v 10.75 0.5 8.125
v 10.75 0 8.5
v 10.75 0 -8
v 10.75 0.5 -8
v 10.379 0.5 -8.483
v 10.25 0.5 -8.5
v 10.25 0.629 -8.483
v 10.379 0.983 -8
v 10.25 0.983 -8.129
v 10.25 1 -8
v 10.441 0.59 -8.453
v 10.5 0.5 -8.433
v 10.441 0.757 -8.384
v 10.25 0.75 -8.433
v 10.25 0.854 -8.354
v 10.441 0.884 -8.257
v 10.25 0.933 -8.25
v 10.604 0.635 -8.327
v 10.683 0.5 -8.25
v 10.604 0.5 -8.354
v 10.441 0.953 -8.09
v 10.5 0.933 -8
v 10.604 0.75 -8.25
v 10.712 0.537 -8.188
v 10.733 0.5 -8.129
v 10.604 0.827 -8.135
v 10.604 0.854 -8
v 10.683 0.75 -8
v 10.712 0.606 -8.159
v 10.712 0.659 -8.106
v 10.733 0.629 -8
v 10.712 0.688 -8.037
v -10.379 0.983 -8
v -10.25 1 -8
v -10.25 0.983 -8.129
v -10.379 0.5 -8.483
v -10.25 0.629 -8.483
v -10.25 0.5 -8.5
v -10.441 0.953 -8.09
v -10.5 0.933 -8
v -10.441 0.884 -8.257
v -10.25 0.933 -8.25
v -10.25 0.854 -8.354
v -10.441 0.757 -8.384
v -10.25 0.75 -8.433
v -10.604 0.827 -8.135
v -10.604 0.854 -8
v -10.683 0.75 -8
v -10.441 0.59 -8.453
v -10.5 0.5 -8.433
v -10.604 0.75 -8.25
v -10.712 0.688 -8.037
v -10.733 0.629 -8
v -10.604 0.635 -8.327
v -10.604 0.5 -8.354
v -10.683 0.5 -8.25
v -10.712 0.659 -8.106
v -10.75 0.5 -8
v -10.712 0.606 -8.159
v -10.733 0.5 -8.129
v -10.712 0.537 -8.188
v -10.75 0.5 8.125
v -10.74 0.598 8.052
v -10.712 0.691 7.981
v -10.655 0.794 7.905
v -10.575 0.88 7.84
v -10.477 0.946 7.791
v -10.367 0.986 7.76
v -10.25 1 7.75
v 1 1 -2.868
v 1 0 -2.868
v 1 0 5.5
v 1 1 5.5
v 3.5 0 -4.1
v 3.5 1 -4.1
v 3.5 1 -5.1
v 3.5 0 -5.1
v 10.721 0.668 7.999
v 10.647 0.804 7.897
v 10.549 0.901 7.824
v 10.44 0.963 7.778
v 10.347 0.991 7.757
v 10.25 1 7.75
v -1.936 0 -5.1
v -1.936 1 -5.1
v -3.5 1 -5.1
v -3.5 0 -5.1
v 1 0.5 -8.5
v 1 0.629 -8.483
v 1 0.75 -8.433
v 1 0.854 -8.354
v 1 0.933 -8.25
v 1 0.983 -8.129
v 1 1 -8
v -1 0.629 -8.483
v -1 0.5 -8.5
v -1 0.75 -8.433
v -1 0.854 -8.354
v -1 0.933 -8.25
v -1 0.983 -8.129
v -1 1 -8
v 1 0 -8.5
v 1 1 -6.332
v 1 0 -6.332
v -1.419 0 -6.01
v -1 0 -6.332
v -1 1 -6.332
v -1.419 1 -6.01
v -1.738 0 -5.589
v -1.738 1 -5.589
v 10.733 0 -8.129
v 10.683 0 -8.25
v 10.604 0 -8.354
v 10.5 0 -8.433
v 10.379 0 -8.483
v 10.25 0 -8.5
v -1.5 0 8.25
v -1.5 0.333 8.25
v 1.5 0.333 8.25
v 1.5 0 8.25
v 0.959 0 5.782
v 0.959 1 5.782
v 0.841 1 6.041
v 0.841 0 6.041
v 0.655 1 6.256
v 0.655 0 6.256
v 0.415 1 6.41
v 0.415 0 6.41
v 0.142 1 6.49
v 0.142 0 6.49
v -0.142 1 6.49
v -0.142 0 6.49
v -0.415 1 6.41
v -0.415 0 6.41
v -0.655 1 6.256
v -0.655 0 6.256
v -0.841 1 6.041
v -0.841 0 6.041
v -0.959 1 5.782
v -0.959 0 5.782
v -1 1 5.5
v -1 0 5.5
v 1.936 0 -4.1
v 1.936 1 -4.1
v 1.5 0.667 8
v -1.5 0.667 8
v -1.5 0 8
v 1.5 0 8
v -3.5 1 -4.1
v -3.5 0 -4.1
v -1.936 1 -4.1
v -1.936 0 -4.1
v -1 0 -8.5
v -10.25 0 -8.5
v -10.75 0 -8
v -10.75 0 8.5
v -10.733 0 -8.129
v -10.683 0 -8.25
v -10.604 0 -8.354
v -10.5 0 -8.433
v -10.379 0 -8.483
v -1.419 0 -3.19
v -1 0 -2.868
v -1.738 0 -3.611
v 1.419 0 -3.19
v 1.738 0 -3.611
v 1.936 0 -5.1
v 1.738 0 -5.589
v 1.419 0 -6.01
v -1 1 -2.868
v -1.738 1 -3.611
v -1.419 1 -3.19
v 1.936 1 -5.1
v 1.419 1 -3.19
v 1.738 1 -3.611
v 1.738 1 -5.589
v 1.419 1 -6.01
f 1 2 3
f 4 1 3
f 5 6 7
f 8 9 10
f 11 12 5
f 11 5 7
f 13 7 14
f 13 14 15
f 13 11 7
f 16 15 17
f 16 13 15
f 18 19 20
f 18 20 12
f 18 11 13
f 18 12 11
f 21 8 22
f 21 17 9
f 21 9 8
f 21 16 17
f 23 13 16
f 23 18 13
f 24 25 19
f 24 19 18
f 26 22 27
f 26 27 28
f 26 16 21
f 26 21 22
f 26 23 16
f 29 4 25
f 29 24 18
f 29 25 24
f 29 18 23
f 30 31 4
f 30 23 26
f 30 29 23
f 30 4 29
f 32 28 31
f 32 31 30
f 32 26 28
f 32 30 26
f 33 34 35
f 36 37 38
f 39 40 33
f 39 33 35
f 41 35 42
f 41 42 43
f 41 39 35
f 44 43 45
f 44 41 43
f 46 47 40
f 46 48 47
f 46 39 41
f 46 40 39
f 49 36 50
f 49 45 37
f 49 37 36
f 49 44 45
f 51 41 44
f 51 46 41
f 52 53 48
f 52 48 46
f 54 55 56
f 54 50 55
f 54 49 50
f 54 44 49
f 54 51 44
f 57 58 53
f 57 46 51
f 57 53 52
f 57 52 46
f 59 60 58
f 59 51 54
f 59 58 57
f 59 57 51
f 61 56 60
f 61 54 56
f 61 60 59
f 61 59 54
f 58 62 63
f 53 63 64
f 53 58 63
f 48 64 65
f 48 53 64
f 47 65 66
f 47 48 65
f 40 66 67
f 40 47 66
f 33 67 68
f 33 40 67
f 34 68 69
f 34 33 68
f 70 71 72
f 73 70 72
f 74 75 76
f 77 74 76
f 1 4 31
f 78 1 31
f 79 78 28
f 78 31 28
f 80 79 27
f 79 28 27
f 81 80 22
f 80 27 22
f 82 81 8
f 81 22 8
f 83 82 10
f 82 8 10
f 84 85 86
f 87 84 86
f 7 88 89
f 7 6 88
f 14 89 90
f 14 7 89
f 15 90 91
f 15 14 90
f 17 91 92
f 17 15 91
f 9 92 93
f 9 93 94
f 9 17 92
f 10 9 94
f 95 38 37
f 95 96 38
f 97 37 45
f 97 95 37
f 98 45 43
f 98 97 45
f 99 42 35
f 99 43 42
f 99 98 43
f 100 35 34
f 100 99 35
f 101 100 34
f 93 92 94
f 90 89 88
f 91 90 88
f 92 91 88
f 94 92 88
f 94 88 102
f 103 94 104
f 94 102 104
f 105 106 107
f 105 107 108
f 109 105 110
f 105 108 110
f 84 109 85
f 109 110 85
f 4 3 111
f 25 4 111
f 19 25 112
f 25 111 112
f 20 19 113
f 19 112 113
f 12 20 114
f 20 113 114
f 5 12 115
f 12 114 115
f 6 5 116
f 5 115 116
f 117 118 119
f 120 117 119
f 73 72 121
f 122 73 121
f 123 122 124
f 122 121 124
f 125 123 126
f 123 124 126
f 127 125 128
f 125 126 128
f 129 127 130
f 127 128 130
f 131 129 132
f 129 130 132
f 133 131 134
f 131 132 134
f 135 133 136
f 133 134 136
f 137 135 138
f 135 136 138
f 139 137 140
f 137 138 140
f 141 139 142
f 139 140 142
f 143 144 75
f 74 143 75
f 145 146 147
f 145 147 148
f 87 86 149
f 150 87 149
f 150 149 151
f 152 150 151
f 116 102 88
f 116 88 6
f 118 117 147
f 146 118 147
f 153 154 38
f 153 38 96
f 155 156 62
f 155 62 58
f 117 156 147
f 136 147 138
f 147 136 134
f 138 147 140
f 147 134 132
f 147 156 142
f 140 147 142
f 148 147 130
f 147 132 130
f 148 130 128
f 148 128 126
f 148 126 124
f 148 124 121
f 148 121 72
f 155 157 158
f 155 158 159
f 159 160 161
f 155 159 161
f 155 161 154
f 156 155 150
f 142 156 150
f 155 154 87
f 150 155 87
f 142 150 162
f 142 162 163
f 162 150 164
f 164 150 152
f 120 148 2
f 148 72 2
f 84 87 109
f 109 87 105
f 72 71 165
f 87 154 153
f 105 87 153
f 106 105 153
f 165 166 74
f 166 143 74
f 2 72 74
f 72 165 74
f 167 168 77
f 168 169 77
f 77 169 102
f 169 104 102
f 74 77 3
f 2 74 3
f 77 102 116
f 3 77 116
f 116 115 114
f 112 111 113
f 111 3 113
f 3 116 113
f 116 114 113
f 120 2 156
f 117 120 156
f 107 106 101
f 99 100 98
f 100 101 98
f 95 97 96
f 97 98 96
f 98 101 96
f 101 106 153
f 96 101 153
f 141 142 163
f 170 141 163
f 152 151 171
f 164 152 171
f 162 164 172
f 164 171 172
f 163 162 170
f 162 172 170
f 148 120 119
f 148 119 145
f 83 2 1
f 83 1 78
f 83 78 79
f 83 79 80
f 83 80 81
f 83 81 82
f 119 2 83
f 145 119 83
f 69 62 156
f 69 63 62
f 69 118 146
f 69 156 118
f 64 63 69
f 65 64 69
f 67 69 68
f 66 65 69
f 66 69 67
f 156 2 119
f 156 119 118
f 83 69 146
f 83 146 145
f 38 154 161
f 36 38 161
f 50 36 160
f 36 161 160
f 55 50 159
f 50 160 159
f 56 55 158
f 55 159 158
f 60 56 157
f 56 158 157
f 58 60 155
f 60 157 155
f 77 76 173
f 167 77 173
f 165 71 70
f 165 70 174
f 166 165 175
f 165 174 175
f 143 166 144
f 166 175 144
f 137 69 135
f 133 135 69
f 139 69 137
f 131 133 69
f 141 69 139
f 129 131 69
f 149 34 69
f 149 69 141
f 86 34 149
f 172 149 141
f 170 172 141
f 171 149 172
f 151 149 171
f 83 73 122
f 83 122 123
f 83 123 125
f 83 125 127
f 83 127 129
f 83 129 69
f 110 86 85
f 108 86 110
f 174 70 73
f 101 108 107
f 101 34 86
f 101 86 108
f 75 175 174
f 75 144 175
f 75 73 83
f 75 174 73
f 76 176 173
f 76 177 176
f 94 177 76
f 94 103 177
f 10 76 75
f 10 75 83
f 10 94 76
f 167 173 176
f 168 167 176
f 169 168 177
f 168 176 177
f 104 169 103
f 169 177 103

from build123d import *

# Parameters (mm, degrees)
SKIZZE1_W                       = 21.5
SKIZZE1_H                       = 17
AUFSATZ_LINEAR_AUSTRAGEN1_DEPTH = 1
VERRUNDUNG1_R                   = 0.5
SCHNITT_LINEAR_AUSTRAGEN1_REACH = 25.141
SKIZZE4_W                       = 3
SKIZZE4_H                       = 0.25
SCHNITT_LINEAR_AUSTRAGEN2_DEPTH = 1
VERRUNDUNG2_R                   = 0.5
SCHNITT_LINEAR_AUSTRAGEN3_DEPTH = 1
SCHNITT_LINEAR_START            = -1
SCHNITT_LINEAR_AUSTRAGEN4_DEPTH = 1


with BuildPart() as part:
    # Skizze1 → Aufsatz-Linear austragen1 (new body)
    with BuildSketch(Plane(origin=(0, 0, 0), x_dir=(1, 0, 0), z_dir=(0, 1, 0))):
        Rectangle(SKIZZE1_W, SKIZZE1_H)
    extrude(amount=AUFSATZ_LINEAR_AUSTRAGEN1_DEPTH)

    # Verrundung1
    verrundung1_edges = [part.edges().sort_by_distance(p)[0] for p in [
        (-10.75, 1, 0),
        (10.75, 1, 0),
        (0, 1, -8.5),
    ]]
    fillet(verrundung1_edges, radius=VERRUNDUNG1_R)

    # Schnitt-Linear austragen1: up to this face of the body (flat: up to its plane)
    schnitt_linear_austragen1_end = Plane(part.part.faces().sort_by_distance((10.75, 0.25, 0))[0])
    # Skizze2 → Schnitt-Linear austragen1 (cut, up to the picked face)
    with BuildSketch(Plane.ZY.offset(10.75), mode=Mode.PRIVATE) as schnitt_linear_austragen1_sk1:
        Polygon((8.5, 0), (7.75, 1), (8.5, 1), align=None)
    schnitt_linear_austragen1_tool1 = split(extrude(schnitt_linear_austragen1_sk1.sketch, amount=-SCHNITT_LINEAR_AUSTRAGEN1_REACH, mode=Mode.PRIVATE), bisect_by=schnitt_linear_austragen1_end, keep=Keep.BOTH, mode=Mode.PRIVATE)
    add(schnitt_linear_austragen1_tool1.solids().sort_by(Axis((-10.75, 0.666667, 8.25), (1, 0, 0)))[0], mode=Mode.SUBTRACT)

    # Skizze4 → Schnitt-Linear austragen2 (cut)
    with BuildSketch(Plane(origin=(0, 1, 0), x_dir=(1, 0, 0), z_dir=(0, 1, 0))):
        with Locations((0, -8.125)):
            Rectangle(SKIZZE4_W, SKIZZE4_H)
    extrude(amount=-SCHNITT_LINEAR_AUSTRAGEN2_DEPTH, mode=Mode.SUBTRACT)

    # Verrundung2
    # the kernel refuses this fillet: 0.5 mm, written as the material it takes off along each edge
    with BuildSketch(Plane(origin=(-10.25, 0.5, -8), x_dir=(0, 0, -1), z_dir=(-1, 0, 0))) as verrundung2_piece_1_section:
        Polygon((0, 0), (VERRUNDUNG2_R, 0), (VERRUNDUNG2_R, -VERRUNDUNG2_R), (0, -VERRUNDUNG2_R), align=None)
    verrundung2_piece_1 = extrude(amount=VERRUNDUNG2_R, mode=Mode.PRIVATE)
    verrundung2_piece_1 = verrundung2_piece_1 - Plane(origin=(-10.25, 0.5, -8), x_dir=(0, -0.7071067811865475, 0.7071067811865475), z_dir=(-1, 0, 0)) * Sphere(VERRUNDUNG2_R, mode=Mode.PRIVATE)
    add(verrundung2_piece_1, mode=Mode.SUBTRACT)
    with BuildSketch(Plane(origin=(10.25, 0.5, -8), x_dir=(0, 0, -1), z_dir=(1, 0, 0))) as verrundung2_piece_2_section:
        Polygon((0, 0), (VERRUNDUNG2_R, 0), (VERRUNDUNG2_R, VERRUNDUNG2_R), (0, VERRUNDUNG2_R), align=None)
    verrundung2_piece_2 = extrude(amount=VERRUNDUNG2_R, mode=Mode.PRIVATE)
    verrundung2_piece_2 = verrundung2_piece_2 - Plane(origin=(10.25, 0.5, -8), x_dir=(0, -0.7071067811865475, 0.7071067811865475), z_dir=(1, 0, 0)) * Sphere(VERRUNDUNG2_R, mode=Mode.PRIVATE)
    add(verrundung2_piece_2, mode=Mode.SUBTRACT)
    with BuildSketch(Plane(origin=(10.75, -1.25, -8.5), x_dir=(0, 0, 1), z_dir=(0, 1, 0))) as verrundung2_piece_3:
        with BuildLine():
            CenterArc((VERRUNDUNG2_R, -VERRUNDUNG2_R), VERRUNDUNG2_R, 90, 90)
            Line((0, -VERRUNDUNG2_R), (0, 0))
            Line((0, 0), (VERRUNDUNG2_R, 0))
        make_face()
    extrude(amount=1.75, mode=Mode.SUBTRACT)
    with BuildSketch(Plane(origin=(-10.75, -1.25, -8.5), x_dir=(0, 0, 1), z_dir=(0, 1, 0))) as verrundung2_piece_4:
        with BuildLine():
            CenterArc((VERRUNDUNG2_R, VERRUNDUNG2_R), VERRUNDUNG2_R, 180, 90)
            Line((0, VERRUNDUNG2_R), (0, 0))
            Line((0, 0), (VERRUNDUNG2_R, 0))
        make_face()
    extrude(amount=1.75, mode=Mode.SUBTRACT)

    # Skizze5 → Schnitt-Linear austragen3 (cut)
    with BuildSketch(Plane(origin=(0, 1, 0), x_dir=(1, 0, 0), z_dir=(0, 1, 0))):
        with BuildLine():
            Line((-3.5, 5.1), (-3.5, 4.1))
            Line((-3.5, 4.1), (-1.936491673, 4.1))
            ThreePointArc((-1.936491673, 4.1), (-2, 4.6), (-1.936491673, 5.1))
            Line((-1.936491673, 5.1), (-3.5, 5.1))
        make_face()
        with BuildLine():
            ThreePointArc((1.936491673, 5.1), (0, 6.6), (-1.936491673, 5.1))
            Line((-1.936491673, 5.1), (1.936491673, 5.1))
        make_face()
        with BuildLine():
            ThreePointArc((-1.936491673, 5.1), (-2, 4.6), (-1.936491673, 4.1))
            Line((-1.936491673, 4.1), (1.936491673, 4.1))
            ThreePointArc((1.936491673, 4.1), (1.984059393, 4.347991415), (2, 4.6))
            ThreePointArc((2, 4.6), (1.984059393, 4.852008585), (1.936491673, 5.1))
            Line((1.936491673, 5.1), (-1.936491673, 5.1))
        make_face()
        with BuildLine():
            Line((1.936491673, 4.1), (-1.936491673, 4.1))
            ThreePointArc((-1.936491673, 4.1), (0, 2.6), (1.936491673, 4.1))
        make_face()
        with BuildLine():
            ThreePointArc((2, 4.6), (1.984059393, 4.347991415), (1.936491673, 4.1))
            Line((1.936491673, 4.1), (3.5, 4.1))
            Line((3.5, 4.1), (3.5, 5.1))
            Line((3.5, 5.1), (1.936491673, 5.1))
            ThreePointArc((1.936491673, 5.1), (1.984059393, 4.852008585), (2, 4.6))
        make_face()
    extrude(amount=-SCHNITT_LINEAR_AUSTRAGEN3_DEPTH, mode=Mode.SUBTRACT)

    # Skizze6 → Schnitt-Linear austragen4 (cut)
    with BuildSketch(Plane(origin=(0, 1, 0), x_dir=(1, 0, 0), z_dir=(0, 1, 0)).offset(SCHNITT_LINEAR_START)):
        with BuildLine():
            Line((1, 8.5), (1, -5.5))
            ThreePointArc((1, -5.5), (0, -6.5), (-1, -5.5))
            Line((-1, -5.5), (-1, 8.5))
            ThreePointArc((-1, 8.5), (0, 9.5), (1, 8.5))
        make_face()
    extrude(amount=SCHNITT_LINEAR_AUSTRAGEN4_DEPTH, mode=Mode.SUBTRACT)


solid = part.part
